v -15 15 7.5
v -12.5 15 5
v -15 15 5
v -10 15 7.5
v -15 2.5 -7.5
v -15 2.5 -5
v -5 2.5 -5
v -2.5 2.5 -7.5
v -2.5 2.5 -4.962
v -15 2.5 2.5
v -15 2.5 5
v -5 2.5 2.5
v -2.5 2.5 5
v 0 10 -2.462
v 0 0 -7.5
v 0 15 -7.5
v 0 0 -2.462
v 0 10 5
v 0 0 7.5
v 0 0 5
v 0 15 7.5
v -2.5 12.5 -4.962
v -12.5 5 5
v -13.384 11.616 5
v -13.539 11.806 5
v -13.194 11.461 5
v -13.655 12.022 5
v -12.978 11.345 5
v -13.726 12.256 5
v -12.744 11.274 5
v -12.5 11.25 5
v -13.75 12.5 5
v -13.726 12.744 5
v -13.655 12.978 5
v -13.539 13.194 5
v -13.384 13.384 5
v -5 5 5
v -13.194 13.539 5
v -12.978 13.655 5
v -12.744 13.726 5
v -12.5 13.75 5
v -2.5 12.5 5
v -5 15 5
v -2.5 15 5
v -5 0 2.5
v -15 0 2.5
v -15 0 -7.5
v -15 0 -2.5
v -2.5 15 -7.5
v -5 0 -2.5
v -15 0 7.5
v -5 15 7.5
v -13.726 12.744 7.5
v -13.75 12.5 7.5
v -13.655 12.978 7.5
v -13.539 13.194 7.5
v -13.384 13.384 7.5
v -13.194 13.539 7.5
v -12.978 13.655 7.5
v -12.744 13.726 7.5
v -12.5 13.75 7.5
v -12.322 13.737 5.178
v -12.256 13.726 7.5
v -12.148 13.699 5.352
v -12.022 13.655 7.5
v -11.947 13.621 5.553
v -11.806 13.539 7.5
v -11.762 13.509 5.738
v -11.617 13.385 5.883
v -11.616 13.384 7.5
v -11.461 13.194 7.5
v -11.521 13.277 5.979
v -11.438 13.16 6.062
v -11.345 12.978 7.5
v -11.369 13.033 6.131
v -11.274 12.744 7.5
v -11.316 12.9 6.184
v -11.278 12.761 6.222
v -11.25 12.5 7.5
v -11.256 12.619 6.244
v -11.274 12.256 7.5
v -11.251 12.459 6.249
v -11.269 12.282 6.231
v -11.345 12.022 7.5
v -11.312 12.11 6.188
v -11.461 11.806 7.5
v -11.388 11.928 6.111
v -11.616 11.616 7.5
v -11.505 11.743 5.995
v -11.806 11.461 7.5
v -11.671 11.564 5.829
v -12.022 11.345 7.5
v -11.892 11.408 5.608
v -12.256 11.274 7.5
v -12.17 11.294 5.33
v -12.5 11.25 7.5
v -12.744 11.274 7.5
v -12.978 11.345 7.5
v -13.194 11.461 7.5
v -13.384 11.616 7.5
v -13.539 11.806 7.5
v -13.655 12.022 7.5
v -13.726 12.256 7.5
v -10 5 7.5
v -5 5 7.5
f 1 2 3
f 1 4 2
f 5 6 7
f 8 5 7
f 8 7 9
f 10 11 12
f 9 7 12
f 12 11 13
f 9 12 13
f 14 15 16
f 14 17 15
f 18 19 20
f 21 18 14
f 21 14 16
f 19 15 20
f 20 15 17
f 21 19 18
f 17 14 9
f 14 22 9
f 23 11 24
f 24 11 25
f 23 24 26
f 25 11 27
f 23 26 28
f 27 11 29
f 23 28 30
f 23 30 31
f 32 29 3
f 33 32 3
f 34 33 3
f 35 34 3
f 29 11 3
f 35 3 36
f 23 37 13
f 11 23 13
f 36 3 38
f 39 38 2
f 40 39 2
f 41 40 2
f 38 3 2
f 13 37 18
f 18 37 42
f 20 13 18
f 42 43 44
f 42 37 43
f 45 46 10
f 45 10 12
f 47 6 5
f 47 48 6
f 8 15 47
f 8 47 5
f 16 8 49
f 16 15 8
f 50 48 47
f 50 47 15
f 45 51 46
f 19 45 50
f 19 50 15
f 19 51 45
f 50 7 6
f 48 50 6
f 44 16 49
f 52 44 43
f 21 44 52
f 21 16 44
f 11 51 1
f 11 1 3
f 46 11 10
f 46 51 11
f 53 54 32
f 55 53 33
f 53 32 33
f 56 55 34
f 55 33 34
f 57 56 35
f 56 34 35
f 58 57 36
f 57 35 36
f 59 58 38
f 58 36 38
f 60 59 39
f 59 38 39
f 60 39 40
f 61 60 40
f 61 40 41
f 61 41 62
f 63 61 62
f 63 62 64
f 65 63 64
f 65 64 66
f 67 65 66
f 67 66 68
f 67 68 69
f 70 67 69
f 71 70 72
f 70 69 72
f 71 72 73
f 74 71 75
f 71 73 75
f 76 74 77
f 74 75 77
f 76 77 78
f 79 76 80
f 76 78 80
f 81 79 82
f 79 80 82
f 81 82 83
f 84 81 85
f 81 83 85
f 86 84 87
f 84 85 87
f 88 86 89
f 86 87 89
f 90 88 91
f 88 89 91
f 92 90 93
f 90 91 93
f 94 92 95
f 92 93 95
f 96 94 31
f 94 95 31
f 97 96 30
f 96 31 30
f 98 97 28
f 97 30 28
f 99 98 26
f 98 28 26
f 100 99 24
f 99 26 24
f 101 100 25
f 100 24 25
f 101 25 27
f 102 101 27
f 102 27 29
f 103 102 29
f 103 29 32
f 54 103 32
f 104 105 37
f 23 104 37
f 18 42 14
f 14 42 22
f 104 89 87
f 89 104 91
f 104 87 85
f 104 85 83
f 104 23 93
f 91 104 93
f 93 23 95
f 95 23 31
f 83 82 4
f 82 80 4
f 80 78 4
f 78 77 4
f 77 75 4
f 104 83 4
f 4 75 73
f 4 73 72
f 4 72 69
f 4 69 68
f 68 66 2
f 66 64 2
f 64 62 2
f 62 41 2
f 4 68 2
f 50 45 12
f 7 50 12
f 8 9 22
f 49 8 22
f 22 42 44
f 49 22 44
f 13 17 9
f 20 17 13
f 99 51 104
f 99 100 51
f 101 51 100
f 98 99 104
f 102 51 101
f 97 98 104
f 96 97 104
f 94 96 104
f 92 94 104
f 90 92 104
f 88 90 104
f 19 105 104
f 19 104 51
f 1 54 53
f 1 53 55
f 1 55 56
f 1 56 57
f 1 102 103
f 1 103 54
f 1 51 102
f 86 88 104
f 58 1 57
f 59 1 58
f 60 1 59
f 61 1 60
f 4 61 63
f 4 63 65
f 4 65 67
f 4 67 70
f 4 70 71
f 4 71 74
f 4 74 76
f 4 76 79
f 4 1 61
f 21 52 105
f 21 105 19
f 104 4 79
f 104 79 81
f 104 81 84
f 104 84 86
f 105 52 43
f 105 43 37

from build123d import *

# Parameters (mm, degrees)
F2_DEPTH = 2.5
F3_DEPTH = 2.5
F4_SIZE  = 2.49999
F8_DEPTH = 2.5
F9_SIZE  = 2.49999
F10_D    = 2.5


# Not quite as in the source:
# - a fillet or chamfer is up to 0.001 mm smaller than in the source, because OpenCascade refuses the exact size
# - a feature of the source that left no trace in its solid (it failed there, or was rolled back) is left out


with BuildPart() as f2:
    # F0 (on Front) → F2 (new body)
    with BuildSketch(Plane.XZ):
        Polygon((0, 7.5), (-15, 7.5), (-15, 2.5), (-5, 2.5), (-5, -2.5), (-15, -2.5), (-15, -7.5), (0, -7.5), align=None)
    extrude(amount=-F2_DEPTH)

    # F1 (on Right) → F3 (join)
    with BuildSketch(Plane.YZ):
        Polygon((15, -7.5), (15, -2.4617532641), (15, 5), (15, 7.5), (10, 7.5), (10, 5), (10, -2.4617532641), (0, -2.4617532641), (0, -7.5), align=None)
    extrude(amount=-F3_DEPTH)

    # F4 (call 1 of 3: OpenCascade refuses the feature's edges together) (size 2.5 in the source; OpenCascade refuses exactly that, so slightly less here)
    f4_edges = [f2.edges().sort_by_distance(p)[0] for p in [
        (0, 2.5, 2.519123),
    ]]
    chamfer(f4_edges, length=F4_SIZE)

    # F4#2 (call 2 of 3) (size 2.5 in the source; OpenCascade refuses exactly that, so slightly less here)
    f4_2_edges = [f2.edges().sort_by_distance(p)[0] for p in [
        (-10, 2.5, -2.5),
    ]]
    chamfer(f4_2_edges, length=F4_SIZE)

    # F4#3 (call 3 of 3) (size 2.5 in the source; OpenCascade refuses exactly that, so slightly less here)
    f4_3_edges = [f2.edges().sort_by_distance(p)[0] for p in [
        (-2.5, 10, 2.519123),
        (-2.5, 6.25, -2.461753),
    ]]
    chamfer(f4_3_edges, length=F4_SIZE)

    # F7 (on offset) → F8 (join)
    with BuildSketch(Plane.XY.offset(7.5)):
        Polygon((0, 0), (0, 15), (-5, 15), (-5, 5), (-10, 5), (-10, 15), (-15, 15), (-15, 0), align=None)
    extrude(amount=-F8_DEPTH)

    # F9 (size 2.5 in the source; OpenCascade refuses exactly that, so slightly less here)
    f9_edges = [f2.edges().sort_by_distance(p)[0] for p in [
        (-10, 10, 5),
    ]]
    chamfer(f9_edges, length=F9_SIZE)

    # F10 (through all)
    with Locations(Plane.XY.offset(7.5)):
        with Locations((-12.5, 12.5)):
            Hole(F10_D / 2)


solid = f2.part
